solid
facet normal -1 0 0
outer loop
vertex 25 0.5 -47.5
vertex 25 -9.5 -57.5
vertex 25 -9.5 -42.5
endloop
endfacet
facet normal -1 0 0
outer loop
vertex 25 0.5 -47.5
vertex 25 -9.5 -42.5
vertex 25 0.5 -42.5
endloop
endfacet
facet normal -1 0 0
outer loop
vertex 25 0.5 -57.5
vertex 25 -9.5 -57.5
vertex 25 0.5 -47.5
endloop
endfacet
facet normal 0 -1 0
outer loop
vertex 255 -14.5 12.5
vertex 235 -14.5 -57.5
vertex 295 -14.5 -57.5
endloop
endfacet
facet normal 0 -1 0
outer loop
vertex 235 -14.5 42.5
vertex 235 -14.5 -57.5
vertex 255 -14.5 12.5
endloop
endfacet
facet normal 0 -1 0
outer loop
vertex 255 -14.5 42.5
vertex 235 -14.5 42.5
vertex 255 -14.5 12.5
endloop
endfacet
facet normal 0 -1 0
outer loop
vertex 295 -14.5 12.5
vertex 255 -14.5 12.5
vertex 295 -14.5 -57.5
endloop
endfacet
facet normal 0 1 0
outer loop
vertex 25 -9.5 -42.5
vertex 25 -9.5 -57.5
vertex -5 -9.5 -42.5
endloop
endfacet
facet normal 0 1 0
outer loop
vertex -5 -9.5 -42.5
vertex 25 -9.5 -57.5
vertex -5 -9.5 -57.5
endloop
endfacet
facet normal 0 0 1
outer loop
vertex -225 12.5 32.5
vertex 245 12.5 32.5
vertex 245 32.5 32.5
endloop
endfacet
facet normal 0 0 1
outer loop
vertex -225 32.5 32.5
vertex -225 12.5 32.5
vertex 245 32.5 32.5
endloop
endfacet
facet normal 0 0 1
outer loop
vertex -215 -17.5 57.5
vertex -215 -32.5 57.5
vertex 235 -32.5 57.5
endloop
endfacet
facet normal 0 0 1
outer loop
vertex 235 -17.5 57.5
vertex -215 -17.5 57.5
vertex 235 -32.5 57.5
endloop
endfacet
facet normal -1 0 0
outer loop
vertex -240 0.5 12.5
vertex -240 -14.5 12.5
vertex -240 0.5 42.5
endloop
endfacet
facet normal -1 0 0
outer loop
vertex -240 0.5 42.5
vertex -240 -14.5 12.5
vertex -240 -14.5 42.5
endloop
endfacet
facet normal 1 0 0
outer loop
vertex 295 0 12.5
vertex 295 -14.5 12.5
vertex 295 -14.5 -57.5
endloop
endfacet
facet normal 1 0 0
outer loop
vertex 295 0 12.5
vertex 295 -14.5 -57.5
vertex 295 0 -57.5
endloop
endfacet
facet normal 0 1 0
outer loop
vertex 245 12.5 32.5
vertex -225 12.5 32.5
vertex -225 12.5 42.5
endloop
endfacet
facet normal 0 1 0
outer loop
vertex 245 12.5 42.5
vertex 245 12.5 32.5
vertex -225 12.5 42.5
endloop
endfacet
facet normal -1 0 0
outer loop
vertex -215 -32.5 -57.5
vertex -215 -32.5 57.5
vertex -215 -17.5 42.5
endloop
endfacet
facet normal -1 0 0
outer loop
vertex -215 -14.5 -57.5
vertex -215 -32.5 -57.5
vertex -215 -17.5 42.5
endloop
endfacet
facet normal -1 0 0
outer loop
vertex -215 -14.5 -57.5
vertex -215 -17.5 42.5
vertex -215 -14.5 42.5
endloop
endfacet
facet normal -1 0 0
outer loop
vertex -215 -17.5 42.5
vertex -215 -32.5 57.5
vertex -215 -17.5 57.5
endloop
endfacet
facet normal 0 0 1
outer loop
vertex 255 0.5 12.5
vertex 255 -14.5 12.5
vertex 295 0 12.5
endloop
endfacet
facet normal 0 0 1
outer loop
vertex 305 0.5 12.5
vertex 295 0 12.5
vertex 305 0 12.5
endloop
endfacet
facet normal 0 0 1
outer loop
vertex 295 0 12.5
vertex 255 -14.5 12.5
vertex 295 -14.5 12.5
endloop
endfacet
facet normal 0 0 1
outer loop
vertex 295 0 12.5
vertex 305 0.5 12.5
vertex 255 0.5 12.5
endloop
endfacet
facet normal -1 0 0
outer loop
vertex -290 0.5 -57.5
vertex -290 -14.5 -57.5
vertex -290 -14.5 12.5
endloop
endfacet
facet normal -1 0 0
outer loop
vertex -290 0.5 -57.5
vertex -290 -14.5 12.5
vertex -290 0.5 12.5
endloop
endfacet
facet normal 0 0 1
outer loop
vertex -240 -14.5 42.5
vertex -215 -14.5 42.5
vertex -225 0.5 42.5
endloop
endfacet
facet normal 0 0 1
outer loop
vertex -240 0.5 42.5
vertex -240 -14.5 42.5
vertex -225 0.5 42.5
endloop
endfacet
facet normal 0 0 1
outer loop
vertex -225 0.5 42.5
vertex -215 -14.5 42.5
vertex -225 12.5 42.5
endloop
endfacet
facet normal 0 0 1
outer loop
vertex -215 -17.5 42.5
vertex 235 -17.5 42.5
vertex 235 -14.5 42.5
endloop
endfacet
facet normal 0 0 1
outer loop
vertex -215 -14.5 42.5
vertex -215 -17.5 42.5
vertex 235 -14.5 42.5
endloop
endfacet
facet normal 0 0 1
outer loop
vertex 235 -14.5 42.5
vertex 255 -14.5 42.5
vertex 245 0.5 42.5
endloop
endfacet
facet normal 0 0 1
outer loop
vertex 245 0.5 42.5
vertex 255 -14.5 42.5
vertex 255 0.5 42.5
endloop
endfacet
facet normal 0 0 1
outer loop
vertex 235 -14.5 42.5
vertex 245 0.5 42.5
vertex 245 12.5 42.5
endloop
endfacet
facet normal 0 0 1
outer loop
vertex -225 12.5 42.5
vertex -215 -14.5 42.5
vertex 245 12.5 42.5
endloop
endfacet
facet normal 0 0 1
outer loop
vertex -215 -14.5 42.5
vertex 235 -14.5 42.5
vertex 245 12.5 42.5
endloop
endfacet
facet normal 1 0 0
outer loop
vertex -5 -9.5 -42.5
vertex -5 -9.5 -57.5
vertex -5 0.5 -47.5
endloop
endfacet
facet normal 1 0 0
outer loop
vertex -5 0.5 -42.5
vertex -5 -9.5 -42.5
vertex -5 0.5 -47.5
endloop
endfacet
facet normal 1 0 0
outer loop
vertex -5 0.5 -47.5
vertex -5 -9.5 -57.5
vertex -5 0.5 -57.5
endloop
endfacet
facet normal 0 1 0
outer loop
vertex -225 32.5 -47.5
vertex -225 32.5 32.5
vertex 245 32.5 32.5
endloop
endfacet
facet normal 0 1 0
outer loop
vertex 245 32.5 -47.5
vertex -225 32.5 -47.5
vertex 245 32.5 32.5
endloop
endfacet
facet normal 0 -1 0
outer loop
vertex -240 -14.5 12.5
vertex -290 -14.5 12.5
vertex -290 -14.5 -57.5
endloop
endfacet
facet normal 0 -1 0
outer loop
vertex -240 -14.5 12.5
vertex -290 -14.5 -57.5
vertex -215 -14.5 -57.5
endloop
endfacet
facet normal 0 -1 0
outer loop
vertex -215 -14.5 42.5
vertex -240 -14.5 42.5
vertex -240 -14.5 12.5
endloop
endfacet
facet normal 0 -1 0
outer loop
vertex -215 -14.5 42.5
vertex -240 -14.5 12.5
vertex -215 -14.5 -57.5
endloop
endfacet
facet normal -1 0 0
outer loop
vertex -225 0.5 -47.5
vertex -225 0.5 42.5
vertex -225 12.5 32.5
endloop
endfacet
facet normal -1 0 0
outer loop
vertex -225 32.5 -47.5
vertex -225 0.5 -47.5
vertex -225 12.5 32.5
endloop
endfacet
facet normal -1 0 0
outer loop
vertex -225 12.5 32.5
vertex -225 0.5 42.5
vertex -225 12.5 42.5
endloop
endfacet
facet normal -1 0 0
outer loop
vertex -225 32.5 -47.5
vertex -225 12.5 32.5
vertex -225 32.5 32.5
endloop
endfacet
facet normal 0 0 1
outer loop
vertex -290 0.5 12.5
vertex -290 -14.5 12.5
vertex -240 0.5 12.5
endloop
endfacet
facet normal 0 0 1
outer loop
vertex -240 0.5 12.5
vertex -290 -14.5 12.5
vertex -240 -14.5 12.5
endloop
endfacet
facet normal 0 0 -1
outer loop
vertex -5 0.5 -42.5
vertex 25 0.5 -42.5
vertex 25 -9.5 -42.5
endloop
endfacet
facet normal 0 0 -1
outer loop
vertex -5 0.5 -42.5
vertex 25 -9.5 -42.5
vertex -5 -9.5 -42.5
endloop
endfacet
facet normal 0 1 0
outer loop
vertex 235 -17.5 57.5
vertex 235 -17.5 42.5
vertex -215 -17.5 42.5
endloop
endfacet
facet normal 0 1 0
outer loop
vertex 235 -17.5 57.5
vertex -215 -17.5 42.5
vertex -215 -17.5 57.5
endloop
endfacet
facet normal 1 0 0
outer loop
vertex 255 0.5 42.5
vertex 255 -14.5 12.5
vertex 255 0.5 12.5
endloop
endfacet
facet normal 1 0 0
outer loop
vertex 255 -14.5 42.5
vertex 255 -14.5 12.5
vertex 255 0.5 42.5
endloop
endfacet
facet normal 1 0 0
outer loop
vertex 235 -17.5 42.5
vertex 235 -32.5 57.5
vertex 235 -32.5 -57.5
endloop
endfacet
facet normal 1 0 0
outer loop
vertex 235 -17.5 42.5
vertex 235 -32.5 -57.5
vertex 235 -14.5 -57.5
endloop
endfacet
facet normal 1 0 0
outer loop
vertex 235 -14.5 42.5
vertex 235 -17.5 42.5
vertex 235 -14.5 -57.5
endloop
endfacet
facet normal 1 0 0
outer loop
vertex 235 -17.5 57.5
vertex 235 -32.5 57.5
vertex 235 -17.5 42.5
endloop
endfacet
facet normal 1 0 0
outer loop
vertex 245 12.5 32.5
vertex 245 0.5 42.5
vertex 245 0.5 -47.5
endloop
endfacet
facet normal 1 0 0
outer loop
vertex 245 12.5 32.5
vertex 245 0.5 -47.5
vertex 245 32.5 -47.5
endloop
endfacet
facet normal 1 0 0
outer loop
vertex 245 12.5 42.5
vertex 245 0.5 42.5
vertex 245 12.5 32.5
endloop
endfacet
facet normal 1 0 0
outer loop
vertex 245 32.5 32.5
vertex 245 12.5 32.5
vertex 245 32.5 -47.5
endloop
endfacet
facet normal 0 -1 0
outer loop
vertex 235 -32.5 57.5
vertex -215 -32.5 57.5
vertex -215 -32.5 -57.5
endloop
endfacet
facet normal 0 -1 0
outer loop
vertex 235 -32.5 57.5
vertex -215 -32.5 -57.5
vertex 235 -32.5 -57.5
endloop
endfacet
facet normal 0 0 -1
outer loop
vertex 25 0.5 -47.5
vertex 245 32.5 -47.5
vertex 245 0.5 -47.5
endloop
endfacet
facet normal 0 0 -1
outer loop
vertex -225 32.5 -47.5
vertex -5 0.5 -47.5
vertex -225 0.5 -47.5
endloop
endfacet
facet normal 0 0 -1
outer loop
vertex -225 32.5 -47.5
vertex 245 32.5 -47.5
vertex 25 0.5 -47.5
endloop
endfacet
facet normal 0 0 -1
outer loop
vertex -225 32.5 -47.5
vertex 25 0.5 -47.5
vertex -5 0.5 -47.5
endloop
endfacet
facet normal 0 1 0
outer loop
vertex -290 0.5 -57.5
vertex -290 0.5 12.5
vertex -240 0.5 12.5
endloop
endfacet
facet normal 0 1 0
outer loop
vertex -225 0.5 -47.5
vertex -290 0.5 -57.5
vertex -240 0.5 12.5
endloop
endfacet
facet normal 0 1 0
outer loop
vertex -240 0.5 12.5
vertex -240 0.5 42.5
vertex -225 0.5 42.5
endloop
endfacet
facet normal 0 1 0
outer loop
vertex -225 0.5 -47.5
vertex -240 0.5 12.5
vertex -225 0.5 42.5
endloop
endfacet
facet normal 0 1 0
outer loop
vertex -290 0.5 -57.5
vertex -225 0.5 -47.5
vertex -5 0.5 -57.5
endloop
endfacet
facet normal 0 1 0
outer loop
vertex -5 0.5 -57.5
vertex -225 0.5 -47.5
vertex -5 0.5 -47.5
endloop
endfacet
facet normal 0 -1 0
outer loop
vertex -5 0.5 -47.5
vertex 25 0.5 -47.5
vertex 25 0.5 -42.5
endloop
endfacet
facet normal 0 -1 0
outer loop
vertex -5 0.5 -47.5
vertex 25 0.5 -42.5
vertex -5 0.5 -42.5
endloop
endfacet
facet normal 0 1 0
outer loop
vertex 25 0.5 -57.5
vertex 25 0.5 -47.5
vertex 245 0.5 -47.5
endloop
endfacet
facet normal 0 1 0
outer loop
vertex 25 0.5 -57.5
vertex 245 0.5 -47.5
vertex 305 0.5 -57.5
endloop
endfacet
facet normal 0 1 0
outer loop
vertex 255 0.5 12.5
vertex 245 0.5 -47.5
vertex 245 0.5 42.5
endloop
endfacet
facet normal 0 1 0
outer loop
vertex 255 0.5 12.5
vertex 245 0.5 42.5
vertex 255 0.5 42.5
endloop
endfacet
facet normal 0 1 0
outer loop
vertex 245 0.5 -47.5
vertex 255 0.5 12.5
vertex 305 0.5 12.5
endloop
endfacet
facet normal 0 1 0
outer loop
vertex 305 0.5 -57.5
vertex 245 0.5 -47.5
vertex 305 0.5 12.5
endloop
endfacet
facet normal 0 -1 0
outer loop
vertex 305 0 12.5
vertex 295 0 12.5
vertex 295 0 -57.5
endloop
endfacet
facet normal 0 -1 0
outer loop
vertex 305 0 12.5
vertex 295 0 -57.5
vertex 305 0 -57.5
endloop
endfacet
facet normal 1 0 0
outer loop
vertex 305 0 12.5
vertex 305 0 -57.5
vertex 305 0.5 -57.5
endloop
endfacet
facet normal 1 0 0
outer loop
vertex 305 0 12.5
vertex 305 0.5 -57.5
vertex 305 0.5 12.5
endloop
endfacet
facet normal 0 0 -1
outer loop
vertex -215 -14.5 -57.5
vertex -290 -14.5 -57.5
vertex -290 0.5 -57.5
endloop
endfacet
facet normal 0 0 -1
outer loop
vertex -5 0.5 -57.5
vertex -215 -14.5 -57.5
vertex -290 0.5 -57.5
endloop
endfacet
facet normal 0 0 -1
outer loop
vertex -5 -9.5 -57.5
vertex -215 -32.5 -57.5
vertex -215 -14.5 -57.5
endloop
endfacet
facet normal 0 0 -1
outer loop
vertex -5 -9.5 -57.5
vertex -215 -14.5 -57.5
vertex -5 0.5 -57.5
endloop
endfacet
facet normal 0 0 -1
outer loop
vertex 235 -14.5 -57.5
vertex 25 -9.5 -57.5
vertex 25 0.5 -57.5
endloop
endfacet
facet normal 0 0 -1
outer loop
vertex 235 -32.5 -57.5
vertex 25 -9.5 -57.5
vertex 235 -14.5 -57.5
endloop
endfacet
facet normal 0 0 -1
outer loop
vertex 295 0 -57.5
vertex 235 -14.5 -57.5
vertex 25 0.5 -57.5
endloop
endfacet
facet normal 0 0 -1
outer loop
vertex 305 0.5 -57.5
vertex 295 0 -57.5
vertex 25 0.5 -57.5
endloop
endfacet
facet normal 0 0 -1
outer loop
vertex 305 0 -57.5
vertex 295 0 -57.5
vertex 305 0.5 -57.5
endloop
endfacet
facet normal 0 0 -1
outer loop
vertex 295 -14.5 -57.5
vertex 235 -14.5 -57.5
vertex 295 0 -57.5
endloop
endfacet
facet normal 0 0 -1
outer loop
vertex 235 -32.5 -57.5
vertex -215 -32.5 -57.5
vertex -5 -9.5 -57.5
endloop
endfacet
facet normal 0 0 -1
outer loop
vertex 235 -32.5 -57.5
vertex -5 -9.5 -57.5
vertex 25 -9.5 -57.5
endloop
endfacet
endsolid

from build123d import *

# Parameters (mm, degrees)
SKETCH042_W     = 610
SKETCH042_H     = 115
PAD004_DEPTH    = 65
SKETCH043_W     = 60
SKETCH043_H     = 32
SKETCH043_W_2   = 70
SKETCH043_H_2   = 18
POCKET037_DEPTH = 115.001
SKETCH044_W     = 80
SKETCH044_H     = 32
SKETCH044_W_2   = 90
SKETCH044_H_2   = 18
POCKET038_DEPTH = 115.001
SKETCH045_W     = 50
SKETCH045_H     = 45
POCKET039_DEPTH = 65.001
SKETCH046_W     = 65
SKETCH046_H     = 45
POCKET040_DEPTH = 65.001
SKETCH047_W     = 30
SKETCH047_H     = 10
POCKET041_DEPTH = 15
SKETCH048_W     = 610
SKETCH048_H     = 32
POCKET042_DEPTH = 10
SKETCH049_W     = 20
SKETCH049_H     = 25
POCKET043_DEPTH = 610.001
SKETCH050_W     = 50
SKETCH050_H     = 15
POCKET044_DEPTH = 610.001
SKETCH051_W     = 15
SKETCH051_H     = 65
POCKET045_DEPTH = 115.001
SKETCH052_W     = 10
SKETCH052_H     = 32.5
POCKET046_DEPTH = 115.001


with BuildPart() as part:
    # Sketch042 (on DatumPlane) → Pad004 (new body)
    with BuildSketch(Plane.XZ.offset(32.5)):
        Rectangle(SKETCH042_W, SKETCH042_H)
    extrude(amount=-PAD004_DEPTH)

    # Sketch043 (on DatumPlane) → Pocket037 (cut, through all)
    with BuildSketch(Plane.XY.offset(57.5)):
        with Locations((275, 16.5)):
            Rectangle(SKETCH043_W, SKETCH043_H)
        with Locations((270, -23.5)):
            Rectangle(SKETCH043_W_2, SKETCH043_H_2)
    extrude(amount=-POCKET037_DEPTH, mode=Mode.SUBTRACT)

    # Sketch044 (on DatumPlane) → Pocket038 (cut, through all)
    with BuildSketch(Plane.XY.offset(57.5)):
        with Locations((-265, 16.5)):
            Rectangle(SKETCH044_W, SKETCH044_H)
        with Locations((-260, -23.5)):
            Rectangle(SKETCH044_W_2, SKETCH044_H_2)
    extrude(amount=-POCKET038_DEPTH, mode=Mode.SUBTRACT)

    # Sketch045 (on DatumPlane) → Pocket039 (cut, through all)
    with BuildSketch(Plane.XZ.offset(32.5)):
        with Locations((280, 35)):
            Rectangle(SKETCH045_W, SKETCH045_H)
    extrude(amount=-POCKET039_DEPTH, mode=Mode.SUBTRACT)

    # Sketch046 (on DatumPlane) → Pocket040 (cut, through all)
    with BuildSketch(Plane.XZ.offset(32.5)):
        with Locations((-272.5, 35)):
            Rectangle(SKETCH046_W, SKETCH046_H)
    extrude(amount=-POCKET040_DEPTH, mode=Mode.SUBTRACT)

    # Sketch047 (on DatumPlane) → Pocket041 (cut)
    with BuildSketch(Plane(origin=(0, 0, -57.5), x_dir=(-1, 0, 0), z_dir=(0, 0, -1))):
        with Locations((-10, -4.5)):
            Rectangle(SKETCH047_W, SKETCH047_H)
    extrude(amount=-POCKET041_DEPTH, mode=Mode.SUBTRACT)

    # Sketch048 (on DatumPlane) → Pocket042 (cut)
    with BuildSketch(Plane(origin=(0, 0, -57.5), x_dir=(-1, 0, 0), z_dir=(0, 0, -1))):
        with Locations((0, 16.5)):
            Rectangle(SKETCH048_W, SKETCH048_H)
    extrude(amount=-POCKET042_DEPTH, mode=Mode.SUBTRACT)

    # Sketch049 (on DatumPlane) → Pocket043 (cut, through all)
    with BuildSketch(Plane.YZ.offset(305)):
        with Locations((22.5, 45)):
            Rectangle(SKETCH049_W, SKETCH049_H)
    extrude(amount=-POCKET043_DEPTH, mode=Mode.SUBTRACT)

    # Sketch050 (on DatumPlane) → Pocket044 (cut, through all)
    with BuildSketch(Plane.YZ.offset(305)):
        with Locations((7.5, 50)):
            Rectangle(SKETCH050_W, SKETCH050_H)
    extrude(amount=-POCKET044_DEPTH, mode=Mode.SUBTRACT)

    # Sketch051 (on DatumPlane) → Pocket045 (cut, through all)
    with BuildSketch(Plane.XY.offset(57.5)):
        with Locations((-297.5, 0)):
            Rectangle(SKETCH051_W, SKETCH051_H)
    extrude(amount=-POCKET045_DEPTH, mode=Mode.SUBTRACT)

    # Sketch052 (on DatumPlane) → Pocket046 (cut, through all)
    with BuildSketch(Plane.XY.offset(57.5)):
        with Locations((300, -16.25)):
            Rectangle(SKETCH052_W, SKETCH052_H)
    extrude(amount=-POCKET046_DEPTH, mode=Mode.SUBTRACT)


solid = part.part
